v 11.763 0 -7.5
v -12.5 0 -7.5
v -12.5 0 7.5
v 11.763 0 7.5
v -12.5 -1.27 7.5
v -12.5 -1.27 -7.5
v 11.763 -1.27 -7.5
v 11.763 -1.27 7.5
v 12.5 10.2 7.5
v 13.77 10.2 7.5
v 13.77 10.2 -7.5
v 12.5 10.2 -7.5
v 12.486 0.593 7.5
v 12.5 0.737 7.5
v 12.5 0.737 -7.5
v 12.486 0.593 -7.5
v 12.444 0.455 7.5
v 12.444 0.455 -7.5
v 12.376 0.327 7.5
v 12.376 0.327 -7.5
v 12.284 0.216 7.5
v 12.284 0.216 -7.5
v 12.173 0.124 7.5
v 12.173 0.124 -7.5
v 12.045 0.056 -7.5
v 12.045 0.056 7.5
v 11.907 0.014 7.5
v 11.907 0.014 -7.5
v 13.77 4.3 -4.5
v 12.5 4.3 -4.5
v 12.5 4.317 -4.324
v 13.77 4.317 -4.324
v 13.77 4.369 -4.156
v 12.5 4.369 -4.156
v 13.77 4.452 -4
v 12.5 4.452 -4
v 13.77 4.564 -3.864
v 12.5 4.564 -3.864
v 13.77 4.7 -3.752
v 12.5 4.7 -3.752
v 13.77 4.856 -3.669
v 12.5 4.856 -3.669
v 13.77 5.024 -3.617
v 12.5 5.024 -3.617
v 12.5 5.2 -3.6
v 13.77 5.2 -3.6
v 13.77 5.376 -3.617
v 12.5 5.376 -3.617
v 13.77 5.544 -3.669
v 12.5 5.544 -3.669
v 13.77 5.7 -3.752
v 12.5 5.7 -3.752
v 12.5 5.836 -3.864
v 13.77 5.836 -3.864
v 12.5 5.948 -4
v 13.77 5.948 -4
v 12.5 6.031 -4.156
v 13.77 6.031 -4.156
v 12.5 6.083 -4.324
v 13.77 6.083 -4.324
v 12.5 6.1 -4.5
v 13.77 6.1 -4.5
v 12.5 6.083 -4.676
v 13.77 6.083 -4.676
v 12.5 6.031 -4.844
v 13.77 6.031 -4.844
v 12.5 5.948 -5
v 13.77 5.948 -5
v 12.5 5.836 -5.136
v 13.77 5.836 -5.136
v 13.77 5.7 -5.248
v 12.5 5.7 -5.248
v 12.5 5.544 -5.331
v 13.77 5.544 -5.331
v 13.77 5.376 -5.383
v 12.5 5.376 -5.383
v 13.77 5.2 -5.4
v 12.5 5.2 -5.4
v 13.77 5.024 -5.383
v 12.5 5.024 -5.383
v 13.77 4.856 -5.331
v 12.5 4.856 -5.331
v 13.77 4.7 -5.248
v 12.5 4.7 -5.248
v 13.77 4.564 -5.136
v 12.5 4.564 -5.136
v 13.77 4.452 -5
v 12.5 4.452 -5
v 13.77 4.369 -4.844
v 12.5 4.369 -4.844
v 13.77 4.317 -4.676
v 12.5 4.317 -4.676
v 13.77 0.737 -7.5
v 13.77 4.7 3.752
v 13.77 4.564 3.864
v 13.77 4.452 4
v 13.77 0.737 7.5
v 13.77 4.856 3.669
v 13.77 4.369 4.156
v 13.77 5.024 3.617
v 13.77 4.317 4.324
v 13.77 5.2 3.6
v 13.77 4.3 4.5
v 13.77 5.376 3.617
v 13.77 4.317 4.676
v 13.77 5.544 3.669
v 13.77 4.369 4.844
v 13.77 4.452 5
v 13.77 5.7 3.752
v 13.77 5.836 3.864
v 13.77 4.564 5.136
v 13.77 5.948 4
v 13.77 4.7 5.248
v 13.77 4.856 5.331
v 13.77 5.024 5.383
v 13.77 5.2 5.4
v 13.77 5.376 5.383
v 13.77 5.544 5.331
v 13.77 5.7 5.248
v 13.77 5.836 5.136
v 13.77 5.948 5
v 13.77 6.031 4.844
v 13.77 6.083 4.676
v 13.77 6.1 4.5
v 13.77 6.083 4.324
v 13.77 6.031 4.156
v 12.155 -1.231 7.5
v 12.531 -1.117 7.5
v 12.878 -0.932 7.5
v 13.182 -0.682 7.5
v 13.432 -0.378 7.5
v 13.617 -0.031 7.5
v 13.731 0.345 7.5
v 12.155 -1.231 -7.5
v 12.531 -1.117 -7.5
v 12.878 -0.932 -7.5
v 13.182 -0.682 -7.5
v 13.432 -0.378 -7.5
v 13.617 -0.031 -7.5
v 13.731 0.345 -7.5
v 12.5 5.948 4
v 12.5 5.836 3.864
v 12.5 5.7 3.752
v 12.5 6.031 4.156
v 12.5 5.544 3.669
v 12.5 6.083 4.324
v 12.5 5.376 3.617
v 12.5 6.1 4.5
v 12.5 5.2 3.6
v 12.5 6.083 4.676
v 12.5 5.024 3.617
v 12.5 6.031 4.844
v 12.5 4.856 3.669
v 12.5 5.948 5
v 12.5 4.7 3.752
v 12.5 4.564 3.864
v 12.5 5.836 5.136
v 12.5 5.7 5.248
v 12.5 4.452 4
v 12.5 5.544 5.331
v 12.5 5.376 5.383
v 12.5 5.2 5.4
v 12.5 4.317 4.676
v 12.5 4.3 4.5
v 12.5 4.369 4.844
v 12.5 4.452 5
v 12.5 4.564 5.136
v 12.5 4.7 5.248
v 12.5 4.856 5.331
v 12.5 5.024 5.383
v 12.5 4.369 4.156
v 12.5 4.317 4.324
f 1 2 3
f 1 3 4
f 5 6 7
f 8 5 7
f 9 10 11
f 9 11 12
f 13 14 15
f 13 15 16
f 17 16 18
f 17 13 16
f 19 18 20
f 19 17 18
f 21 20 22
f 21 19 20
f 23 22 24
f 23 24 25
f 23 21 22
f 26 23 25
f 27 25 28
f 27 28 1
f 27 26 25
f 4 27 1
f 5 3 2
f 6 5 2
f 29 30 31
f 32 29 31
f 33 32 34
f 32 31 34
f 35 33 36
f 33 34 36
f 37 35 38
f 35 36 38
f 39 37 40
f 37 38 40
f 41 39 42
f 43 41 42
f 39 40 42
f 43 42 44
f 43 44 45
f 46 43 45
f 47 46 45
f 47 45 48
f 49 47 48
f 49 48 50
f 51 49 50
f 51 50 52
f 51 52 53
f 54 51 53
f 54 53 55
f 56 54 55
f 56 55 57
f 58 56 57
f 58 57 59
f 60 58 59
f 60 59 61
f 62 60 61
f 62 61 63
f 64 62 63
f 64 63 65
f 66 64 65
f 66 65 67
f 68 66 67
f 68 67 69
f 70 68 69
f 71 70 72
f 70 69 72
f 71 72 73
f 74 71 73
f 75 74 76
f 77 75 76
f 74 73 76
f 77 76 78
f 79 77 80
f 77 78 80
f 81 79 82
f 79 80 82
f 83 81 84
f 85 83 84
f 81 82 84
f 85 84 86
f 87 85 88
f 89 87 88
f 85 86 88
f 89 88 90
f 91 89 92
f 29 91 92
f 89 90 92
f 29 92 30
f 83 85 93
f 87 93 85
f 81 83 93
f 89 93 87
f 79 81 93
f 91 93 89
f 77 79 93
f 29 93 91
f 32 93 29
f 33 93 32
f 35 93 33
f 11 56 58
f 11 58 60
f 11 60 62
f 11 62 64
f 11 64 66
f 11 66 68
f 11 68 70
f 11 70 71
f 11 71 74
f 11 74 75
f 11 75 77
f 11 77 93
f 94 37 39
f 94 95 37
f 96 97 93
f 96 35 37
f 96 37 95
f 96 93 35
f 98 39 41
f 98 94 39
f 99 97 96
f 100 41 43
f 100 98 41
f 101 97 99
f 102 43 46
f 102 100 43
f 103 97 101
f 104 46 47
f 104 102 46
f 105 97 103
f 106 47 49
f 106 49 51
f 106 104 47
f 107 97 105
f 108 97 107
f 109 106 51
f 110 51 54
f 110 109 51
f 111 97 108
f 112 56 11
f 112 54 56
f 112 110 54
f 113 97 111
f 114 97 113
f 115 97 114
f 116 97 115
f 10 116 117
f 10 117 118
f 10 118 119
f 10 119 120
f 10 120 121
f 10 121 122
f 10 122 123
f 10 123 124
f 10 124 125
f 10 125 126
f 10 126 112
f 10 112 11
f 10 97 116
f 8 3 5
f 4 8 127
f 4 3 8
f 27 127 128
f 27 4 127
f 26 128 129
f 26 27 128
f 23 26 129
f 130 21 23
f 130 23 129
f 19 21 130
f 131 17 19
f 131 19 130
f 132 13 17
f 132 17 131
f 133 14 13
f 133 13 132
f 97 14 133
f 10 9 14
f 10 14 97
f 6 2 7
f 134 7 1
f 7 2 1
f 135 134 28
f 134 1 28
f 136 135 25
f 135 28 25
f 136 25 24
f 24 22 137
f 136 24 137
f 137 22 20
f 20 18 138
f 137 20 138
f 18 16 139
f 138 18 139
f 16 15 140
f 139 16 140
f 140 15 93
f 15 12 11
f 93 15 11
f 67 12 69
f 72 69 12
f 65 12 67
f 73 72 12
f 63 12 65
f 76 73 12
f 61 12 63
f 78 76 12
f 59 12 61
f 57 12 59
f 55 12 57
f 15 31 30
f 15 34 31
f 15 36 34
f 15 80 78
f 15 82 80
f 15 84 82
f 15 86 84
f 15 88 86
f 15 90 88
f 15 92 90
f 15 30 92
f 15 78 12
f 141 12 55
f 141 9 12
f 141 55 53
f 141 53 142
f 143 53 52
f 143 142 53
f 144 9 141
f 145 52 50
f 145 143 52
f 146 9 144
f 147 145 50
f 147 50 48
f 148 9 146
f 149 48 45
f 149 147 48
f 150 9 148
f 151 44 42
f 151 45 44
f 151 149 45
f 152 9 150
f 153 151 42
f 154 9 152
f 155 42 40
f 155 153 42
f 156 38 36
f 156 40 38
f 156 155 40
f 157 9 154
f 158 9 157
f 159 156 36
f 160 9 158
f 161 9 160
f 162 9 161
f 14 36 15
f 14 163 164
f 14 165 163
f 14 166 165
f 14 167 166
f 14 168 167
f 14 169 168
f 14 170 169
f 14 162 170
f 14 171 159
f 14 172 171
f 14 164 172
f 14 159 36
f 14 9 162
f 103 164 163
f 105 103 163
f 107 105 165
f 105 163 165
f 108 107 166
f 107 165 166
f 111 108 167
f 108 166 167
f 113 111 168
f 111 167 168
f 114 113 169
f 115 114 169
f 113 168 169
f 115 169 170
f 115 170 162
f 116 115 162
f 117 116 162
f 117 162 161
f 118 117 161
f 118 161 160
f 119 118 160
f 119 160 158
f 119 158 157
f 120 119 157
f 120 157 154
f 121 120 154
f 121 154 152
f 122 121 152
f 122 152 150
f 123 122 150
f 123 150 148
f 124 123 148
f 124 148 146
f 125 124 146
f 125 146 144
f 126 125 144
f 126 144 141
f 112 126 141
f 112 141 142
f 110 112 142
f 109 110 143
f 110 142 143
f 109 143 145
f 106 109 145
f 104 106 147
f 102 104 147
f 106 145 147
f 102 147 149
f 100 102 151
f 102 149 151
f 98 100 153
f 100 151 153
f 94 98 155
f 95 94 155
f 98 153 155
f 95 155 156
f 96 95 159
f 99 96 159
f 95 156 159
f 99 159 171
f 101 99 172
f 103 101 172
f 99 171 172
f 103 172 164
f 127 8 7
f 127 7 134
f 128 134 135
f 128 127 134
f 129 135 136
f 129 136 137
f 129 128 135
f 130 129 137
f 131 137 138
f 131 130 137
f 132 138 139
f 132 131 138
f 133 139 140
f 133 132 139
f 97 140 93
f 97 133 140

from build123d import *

# Parameters (mm, degrees)
SKETCH1_W                    = 25
SKETCH1_H                    = 15
BASE_FLANGE1_DEPTH           = 1.27
EDGE_FLANGE1_STRIP_W         = 6.5532
EDGE_FLANGE1_STRIP_H         = 1.27
EDGE_FLANGE1_STRIP_CUT_DEPTH = 15
EDGE_FLANGE1_DEPTH           = 15
M1_6_CLEARANCE_HOLE1_D       = 1.8


# Sheet-metal steps are written as plain solids
with BuildPart() as part:
    # Sketch1 → Base-Flange1 (new body)
    with BuildSketch(Plane(origin=(0, 0, 0), x_dir=(1, 0, 0), z_dir=(0, 1, 0))):
        Rectangle(SKETCH1_W, SKETCH1_H)
    extrude(amount=-BASE_FLANGE1_DEPTH)

    # Edge-Flange1 strip (across the edge) → Edge-Flange1 strip cut (cut)
    with BuildSketch(Plane(origin=(12.5, 0, 7.5), x_dir=(-1, 0, 0), z_dir=(0, 0, -1))):
        with Locations((-2.54, -0.635)):
            Rectangle(EDGE_FLANGE1_STRIP_W, EDGE_FLANGE1_STRIP_H)
    extrude(amount=EDGE_FLANGE1_STRIP_CUT_DEPTH, mode=Mode.SUBTRACT)

    # Edge-Flange1 section (across the edge) → Edge-Flange1 (add)
    with BuildSketch(Plane(origin=(12.5, 0, 7.5), x_dir=(-1, 0, 0), z_dir=(0, 0, -1))):
        with BuildLine():
            Line((-1.27, 0.7366), (-1.27, 10.2))
            Line((-1.27, 10.2), (0, 10.2))
            Line((0, 10.2), (0, 0.7366))
            ThreePointArc((0, 0.7366), (0.215745145, 0.215745145), (0.7366, 0))
            Line((0.7366, 0), (0.7366, -1.27))
            ThreePointArc((0.7366, -1.27), (-0.682280467, -0.682280467), (-1.27, 0.7366))
        make_face()
    extrude(amount=EDGE_FLANGE1_DEPTH)

    # M1.6 Clearance Hole1 (through all)
    with Locations(Plane(origin=(13.77, 5.2, 4.5), x_dir=(0, 1, 0), z_dir=(1, 0, 0))):
        with Locations((0, 0), (0, -9)):
            Hole(M1_6_CLEARANCE_HOLE1_D / 2)


solid = part.part
